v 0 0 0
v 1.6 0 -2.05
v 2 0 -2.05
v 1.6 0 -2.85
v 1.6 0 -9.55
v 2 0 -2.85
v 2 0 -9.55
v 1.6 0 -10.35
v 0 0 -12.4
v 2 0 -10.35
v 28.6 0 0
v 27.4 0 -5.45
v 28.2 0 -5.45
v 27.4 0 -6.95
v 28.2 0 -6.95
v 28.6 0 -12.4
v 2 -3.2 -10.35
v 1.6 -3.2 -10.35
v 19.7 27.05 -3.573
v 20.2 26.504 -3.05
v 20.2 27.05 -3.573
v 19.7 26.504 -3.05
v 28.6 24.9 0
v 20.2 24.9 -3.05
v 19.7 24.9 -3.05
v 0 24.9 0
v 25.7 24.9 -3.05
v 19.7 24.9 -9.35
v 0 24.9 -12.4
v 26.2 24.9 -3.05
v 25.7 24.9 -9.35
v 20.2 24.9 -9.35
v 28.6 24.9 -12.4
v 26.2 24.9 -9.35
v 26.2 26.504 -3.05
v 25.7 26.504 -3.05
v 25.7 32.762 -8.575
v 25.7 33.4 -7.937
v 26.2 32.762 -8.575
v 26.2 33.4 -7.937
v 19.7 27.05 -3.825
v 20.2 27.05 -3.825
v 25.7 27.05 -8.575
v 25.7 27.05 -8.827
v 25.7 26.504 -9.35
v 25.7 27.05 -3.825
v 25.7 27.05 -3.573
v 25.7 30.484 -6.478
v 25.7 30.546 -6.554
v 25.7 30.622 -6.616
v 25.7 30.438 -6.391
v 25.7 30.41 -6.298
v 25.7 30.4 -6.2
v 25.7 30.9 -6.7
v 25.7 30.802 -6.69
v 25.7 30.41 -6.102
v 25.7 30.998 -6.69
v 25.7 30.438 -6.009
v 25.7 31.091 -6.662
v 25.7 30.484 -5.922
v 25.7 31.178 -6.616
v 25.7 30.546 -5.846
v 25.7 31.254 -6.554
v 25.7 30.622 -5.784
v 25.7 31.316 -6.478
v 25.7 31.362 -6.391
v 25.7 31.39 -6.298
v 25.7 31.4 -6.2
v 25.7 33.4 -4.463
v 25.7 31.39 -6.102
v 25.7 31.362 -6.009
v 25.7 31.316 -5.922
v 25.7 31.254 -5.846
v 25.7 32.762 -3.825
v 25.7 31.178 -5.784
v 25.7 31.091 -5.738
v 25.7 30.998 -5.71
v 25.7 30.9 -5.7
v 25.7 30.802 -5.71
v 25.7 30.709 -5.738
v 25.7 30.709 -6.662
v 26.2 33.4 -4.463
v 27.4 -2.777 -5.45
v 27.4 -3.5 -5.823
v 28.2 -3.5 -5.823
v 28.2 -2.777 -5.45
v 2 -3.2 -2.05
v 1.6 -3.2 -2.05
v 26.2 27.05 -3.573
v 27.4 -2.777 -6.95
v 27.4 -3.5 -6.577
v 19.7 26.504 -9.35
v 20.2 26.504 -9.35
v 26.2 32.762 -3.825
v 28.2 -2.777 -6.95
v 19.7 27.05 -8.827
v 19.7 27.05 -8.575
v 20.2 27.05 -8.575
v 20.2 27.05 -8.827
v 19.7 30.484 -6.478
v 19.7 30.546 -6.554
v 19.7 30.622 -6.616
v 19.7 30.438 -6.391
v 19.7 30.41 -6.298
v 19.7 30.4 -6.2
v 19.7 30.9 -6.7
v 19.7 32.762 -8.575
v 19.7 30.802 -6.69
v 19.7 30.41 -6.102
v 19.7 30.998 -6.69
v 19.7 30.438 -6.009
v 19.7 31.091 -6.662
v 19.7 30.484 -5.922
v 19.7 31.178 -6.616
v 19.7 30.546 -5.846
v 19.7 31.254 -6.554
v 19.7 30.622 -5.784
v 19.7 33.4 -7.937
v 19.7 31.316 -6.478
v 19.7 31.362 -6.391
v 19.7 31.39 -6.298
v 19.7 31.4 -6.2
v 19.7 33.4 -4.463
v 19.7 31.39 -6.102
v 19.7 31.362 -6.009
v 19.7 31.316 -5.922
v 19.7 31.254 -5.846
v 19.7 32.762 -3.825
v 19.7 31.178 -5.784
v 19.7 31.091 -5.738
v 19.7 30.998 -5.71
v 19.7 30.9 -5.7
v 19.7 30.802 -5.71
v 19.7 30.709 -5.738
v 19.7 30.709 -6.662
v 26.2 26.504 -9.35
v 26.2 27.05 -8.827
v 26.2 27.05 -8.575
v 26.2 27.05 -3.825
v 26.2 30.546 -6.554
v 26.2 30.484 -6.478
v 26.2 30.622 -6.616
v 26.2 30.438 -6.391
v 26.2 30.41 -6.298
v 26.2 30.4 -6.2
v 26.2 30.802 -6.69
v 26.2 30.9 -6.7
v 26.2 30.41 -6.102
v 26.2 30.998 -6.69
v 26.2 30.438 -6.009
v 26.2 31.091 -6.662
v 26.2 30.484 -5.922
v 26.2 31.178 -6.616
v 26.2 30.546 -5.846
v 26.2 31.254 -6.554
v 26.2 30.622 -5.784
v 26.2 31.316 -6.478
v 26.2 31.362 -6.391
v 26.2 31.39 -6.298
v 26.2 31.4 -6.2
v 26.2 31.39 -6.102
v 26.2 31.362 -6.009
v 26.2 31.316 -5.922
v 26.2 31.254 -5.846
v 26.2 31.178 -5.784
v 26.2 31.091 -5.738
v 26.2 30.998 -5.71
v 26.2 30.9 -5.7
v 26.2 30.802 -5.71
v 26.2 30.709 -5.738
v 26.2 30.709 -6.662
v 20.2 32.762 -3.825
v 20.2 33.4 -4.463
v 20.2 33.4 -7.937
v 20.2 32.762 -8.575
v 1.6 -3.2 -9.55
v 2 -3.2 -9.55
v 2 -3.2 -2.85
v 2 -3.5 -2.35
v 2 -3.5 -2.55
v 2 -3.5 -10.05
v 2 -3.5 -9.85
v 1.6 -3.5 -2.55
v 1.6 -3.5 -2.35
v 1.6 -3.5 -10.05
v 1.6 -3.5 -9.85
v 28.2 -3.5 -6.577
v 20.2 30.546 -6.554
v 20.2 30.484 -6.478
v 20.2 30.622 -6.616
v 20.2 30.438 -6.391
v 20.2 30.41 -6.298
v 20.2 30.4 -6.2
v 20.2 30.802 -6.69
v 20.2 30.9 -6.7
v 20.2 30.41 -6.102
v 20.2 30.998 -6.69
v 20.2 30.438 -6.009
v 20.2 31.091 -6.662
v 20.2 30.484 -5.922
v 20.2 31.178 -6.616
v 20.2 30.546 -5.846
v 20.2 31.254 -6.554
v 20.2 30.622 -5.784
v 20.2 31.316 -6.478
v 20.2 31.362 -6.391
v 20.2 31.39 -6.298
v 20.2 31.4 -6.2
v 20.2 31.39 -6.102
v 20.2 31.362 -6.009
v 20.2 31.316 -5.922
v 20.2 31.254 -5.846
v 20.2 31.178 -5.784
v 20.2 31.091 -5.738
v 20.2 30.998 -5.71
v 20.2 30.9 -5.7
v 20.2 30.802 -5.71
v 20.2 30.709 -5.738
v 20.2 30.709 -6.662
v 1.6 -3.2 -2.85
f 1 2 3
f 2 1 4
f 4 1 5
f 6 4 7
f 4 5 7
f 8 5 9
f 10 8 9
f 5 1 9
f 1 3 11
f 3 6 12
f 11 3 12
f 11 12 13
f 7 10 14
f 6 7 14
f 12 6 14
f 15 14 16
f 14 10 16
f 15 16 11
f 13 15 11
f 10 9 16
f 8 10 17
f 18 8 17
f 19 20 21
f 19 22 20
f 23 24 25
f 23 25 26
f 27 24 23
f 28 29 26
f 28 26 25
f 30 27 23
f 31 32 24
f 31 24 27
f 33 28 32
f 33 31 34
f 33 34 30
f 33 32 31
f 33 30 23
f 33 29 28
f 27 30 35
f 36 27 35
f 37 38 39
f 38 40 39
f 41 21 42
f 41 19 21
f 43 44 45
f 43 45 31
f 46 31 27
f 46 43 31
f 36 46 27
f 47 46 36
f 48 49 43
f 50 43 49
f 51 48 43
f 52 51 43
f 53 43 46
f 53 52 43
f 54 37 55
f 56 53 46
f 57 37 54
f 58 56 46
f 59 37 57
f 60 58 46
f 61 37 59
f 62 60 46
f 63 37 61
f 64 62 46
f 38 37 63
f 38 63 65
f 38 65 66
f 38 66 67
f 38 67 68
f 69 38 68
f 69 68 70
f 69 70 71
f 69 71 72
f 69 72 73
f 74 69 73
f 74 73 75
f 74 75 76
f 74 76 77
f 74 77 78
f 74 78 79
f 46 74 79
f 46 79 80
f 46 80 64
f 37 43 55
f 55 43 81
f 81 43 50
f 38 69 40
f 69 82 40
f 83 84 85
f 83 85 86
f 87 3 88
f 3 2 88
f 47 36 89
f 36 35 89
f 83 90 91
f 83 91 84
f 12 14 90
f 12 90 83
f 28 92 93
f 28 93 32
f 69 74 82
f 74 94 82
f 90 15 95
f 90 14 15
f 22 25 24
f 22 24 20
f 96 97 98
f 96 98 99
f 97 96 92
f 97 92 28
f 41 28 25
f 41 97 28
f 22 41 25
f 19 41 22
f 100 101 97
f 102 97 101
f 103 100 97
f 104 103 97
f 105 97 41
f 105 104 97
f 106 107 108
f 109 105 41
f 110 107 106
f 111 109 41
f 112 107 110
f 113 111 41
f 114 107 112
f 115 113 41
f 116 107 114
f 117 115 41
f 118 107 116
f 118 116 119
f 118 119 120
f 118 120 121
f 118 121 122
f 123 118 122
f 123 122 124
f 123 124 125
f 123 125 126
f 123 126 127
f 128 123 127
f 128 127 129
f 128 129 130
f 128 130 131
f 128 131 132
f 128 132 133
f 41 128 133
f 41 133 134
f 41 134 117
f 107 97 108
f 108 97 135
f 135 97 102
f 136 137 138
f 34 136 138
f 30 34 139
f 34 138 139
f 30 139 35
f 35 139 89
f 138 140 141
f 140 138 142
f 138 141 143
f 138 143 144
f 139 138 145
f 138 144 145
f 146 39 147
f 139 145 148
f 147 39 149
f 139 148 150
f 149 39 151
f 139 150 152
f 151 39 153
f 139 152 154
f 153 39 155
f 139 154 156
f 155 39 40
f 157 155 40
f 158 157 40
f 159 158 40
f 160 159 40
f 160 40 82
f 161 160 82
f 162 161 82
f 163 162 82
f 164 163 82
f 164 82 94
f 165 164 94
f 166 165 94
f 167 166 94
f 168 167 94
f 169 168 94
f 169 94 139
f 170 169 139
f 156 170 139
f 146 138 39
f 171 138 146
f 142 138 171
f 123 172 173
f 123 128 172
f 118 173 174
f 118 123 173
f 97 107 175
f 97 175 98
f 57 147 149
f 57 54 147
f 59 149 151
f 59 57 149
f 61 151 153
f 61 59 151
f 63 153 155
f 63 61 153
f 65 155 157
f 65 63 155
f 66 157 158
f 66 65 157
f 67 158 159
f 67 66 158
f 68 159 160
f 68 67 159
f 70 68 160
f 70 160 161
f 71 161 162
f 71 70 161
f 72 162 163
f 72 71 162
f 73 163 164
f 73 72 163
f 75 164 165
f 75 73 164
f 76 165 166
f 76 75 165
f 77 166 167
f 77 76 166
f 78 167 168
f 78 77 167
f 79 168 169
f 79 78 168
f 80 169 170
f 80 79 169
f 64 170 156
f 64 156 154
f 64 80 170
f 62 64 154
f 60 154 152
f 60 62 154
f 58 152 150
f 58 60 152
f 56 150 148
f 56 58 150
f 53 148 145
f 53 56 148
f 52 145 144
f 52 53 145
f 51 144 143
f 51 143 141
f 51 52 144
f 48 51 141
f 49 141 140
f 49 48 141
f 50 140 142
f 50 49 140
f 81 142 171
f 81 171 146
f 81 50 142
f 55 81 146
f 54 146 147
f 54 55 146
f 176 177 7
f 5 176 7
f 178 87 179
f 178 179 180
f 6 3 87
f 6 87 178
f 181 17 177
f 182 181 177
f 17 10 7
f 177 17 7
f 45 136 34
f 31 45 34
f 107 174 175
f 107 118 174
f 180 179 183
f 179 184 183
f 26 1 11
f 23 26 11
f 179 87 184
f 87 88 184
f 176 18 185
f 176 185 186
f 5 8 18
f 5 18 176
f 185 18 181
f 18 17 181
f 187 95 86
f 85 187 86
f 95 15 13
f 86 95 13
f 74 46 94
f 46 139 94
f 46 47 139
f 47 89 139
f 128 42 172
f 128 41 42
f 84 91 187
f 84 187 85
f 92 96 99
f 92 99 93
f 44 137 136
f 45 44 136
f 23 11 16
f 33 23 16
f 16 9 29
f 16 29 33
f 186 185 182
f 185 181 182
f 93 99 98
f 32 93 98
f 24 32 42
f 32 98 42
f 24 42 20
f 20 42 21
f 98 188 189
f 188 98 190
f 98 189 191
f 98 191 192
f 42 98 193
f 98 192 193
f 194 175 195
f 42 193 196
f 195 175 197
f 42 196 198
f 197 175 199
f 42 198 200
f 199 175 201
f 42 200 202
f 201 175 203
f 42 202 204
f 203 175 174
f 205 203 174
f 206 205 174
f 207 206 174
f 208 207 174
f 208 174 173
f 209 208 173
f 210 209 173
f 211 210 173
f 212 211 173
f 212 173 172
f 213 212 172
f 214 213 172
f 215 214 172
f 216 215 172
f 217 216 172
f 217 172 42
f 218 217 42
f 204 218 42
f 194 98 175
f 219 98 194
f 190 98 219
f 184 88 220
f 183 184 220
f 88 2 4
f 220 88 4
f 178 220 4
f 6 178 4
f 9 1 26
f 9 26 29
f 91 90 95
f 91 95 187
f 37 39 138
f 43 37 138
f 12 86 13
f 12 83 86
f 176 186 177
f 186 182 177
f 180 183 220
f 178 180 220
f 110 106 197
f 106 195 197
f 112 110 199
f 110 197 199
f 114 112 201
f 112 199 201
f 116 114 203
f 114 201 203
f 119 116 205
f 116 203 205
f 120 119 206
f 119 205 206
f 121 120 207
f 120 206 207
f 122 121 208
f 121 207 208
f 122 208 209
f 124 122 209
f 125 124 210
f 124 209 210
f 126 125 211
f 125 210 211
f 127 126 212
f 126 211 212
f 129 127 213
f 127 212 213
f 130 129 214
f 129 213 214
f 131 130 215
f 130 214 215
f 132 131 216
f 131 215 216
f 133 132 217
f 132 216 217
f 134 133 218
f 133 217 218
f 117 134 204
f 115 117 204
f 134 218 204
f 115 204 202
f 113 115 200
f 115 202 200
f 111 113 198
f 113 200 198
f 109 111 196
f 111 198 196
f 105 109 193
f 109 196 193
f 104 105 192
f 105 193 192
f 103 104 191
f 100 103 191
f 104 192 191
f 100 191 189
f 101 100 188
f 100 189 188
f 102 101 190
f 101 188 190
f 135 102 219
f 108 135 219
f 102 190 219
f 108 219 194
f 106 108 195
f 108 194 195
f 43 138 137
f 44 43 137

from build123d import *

# Parameters (mm, degrees)
CROQUIS1_W              = 28.6
CROQUIS1_H              = 12.4
SALIENTE_EXTRUIR1_DEPTH = 24.9
CROQUIS2_R              = 0.5
SALIENTE_EXTRUIR2_DEPTH = 0.25
SALIENTE_EXTRUIR3_DEPTH = 0.4
SALIENTE_EXTRUIR4_DEPTH = 0.2


with BuildPart() as part:
    # Croquis1 → Saliente-Extruir1 (new body)
    with BuildSketch(Plane(origin=(0, 0, 0), x_dir=(1, 0, 0), z_dir=(0, 1, 0))):
        with Locations((14.3, 6.2)):
            Rectangle(CROQUIS1_W, CROQUIS1_H)
    extrude(amount=SALIENTE_EXTRUIR1_DEPTH)

    # Croquis2 → Saliente-Extruir2 (add, symmetric)
    with BuildSketch(Plane(origin=(25.95, 0, 0), x_dir=(0, 0, -1), z_dir=(1, 0, 0))):
        Polygon((3.05, 24.9), (3.05, 26.504259841), (3.5733005, 27.05), (3.825, 27.05), (3.825, 32.761976859), (4.463023141, 33.4), (7.936976859, 33.4), (8.575, 32.761976859), (8.575, 27.05), (8.8266995, 27.05), (9.35, 26.504259841), (9.35, 24.9), align=None)
        with Locations((6.2, 30.9)):
            Circle(CROQUIS2_R, mode=Mode.SUBTRACT)
    saliente_extruir2 = extrude(amount=SALIENTE_EXTRUIR2_DEPTH, both=True)

    # Simetría1: Saliente-Extruir2 across plane
    add(saliente_extruir2.mirror(Plane(origin=(22.95, 0, 0), x_dir=(0, 0, 1), z_dir=(1, 0, 0))))

    # Croquis4 → Saliente-Extruir3 (add, symmetric)
    with BuildSketch(Plane.ZY.offset(-27.8)):
        Polygon((-6.95, 0), (-6.95, -2.77742352), (-6.577466383, -3.5), (-5.822533617, -3.5), (-5.45, -2.77742352), (-5.45, 0), align=None)
    extrude(amount=SALIENTE_EXTRUIR3_DEPTH, both=True)

    # Croquis6 → Saliente-Extruir4 (add, symmetric)
    with BuildSketch(Plane.ZY.offset(-1.8)):
        Polygon((-10.35, 0), (-10.35, -3.200399192), (-10.050399192, -3.5), (-9.849600808, -3.5), (-9.55, -3.200399192), (-9.55, 0), align=None)
        Polygon((-2.85, 0), (-2.05, 0), (-2.05, -3.200399192), (-2.349600808, -3.5), (-2.550399192, -3.5), (-2.85, -3.200399192), align=None)
    extrude(amount=SALIENTE_EXTRUIR4_DEPTH, both=True)


solid = part.part
